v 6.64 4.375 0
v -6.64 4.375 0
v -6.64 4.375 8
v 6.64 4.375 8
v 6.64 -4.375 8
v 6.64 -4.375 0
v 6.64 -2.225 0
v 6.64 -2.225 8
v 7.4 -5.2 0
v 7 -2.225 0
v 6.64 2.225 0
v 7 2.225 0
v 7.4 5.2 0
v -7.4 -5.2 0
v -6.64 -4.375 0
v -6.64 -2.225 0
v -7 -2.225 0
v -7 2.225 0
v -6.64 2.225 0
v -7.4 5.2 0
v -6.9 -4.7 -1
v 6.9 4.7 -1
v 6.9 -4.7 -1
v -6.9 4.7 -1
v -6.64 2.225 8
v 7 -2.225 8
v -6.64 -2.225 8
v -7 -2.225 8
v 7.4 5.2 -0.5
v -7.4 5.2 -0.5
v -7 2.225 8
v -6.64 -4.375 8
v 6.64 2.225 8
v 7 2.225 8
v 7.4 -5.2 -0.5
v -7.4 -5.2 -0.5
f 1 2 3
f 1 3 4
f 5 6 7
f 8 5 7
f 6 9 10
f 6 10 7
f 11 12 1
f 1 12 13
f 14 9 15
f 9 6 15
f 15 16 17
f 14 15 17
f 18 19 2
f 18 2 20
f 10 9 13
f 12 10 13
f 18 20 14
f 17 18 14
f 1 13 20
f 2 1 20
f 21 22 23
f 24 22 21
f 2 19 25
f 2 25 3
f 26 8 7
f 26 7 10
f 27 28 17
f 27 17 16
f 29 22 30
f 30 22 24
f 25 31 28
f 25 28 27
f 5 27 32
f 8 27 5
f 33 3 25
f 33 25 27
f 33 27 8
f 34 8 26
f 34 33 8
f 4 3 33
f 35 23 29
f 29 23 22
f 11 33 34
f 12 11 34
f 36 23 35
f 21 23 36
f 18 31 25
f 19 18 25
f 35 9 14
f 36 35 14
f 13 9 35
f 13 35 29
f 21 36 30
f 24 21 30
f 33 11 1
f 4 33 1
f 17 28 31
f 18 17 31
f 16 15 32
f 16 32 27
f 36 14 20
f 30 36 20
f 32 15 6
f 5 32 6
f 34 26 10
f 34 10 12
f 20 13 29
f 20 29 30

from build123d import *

# Parameters (mm, degrees)
SKETCH1_W           = 13.28
SKETCH1_H           = 8.75
BOSS_EXTRUDE1_DEPTH = 8
SKETCH2_W           = 14.8
SKETCH2_H           = 10.4
BOSS_EXTRUDE2_DEPTH = 1
CHAMFER2_SIZE       = 0.5
SKETCH3_W           = 14
SKETCH3_H           = 4.45
BOSS_EXTRUDE3_DEPTH = 8


with BuildPart() as part:
    # Sketch1 → Boss-Extrude1 (new body)
    with BuildSketch(Plane.XY):
        Rectangle(SKETCH1_W, SKETCH1_H)
    extrude(amount=BOSS_EXTRUDE1_DEPTH)

    # Sketch2 → Boss-Extrude2 (add)
    with BuildSketch(Plane(origin=(0, 0, 0), x_dir=(-1, 0, 0), z_dir=(0, 0, -1))):
        Rectangle(SKETCH2_W, SKETCH2_H)
    extrude(amount=BOSS_EXTRUDE2_DEPTH)

    # Chamfer2
    chamfer2_edges = [part.edges().sort_by_distance(p)[0] for p in [
        (7.4, 0, -1),
        (0, -5.2, -1),
        (-7.4, 0, -1),
        (0, 5.2, -1),
    ]]
    chamfer(chamfer2_edges, length=CHAMFER2_SIZE)

    # Sketch3 → Boss-Extrude3 (add)
    with BuildSketch(Plane.XY.offset(8)):
        Rectangle(SKETCH3_W, SKETCH3_H)
    extrude(amount=-BOSS_EXTRUDE3_DEPTH)


solid = part.part
